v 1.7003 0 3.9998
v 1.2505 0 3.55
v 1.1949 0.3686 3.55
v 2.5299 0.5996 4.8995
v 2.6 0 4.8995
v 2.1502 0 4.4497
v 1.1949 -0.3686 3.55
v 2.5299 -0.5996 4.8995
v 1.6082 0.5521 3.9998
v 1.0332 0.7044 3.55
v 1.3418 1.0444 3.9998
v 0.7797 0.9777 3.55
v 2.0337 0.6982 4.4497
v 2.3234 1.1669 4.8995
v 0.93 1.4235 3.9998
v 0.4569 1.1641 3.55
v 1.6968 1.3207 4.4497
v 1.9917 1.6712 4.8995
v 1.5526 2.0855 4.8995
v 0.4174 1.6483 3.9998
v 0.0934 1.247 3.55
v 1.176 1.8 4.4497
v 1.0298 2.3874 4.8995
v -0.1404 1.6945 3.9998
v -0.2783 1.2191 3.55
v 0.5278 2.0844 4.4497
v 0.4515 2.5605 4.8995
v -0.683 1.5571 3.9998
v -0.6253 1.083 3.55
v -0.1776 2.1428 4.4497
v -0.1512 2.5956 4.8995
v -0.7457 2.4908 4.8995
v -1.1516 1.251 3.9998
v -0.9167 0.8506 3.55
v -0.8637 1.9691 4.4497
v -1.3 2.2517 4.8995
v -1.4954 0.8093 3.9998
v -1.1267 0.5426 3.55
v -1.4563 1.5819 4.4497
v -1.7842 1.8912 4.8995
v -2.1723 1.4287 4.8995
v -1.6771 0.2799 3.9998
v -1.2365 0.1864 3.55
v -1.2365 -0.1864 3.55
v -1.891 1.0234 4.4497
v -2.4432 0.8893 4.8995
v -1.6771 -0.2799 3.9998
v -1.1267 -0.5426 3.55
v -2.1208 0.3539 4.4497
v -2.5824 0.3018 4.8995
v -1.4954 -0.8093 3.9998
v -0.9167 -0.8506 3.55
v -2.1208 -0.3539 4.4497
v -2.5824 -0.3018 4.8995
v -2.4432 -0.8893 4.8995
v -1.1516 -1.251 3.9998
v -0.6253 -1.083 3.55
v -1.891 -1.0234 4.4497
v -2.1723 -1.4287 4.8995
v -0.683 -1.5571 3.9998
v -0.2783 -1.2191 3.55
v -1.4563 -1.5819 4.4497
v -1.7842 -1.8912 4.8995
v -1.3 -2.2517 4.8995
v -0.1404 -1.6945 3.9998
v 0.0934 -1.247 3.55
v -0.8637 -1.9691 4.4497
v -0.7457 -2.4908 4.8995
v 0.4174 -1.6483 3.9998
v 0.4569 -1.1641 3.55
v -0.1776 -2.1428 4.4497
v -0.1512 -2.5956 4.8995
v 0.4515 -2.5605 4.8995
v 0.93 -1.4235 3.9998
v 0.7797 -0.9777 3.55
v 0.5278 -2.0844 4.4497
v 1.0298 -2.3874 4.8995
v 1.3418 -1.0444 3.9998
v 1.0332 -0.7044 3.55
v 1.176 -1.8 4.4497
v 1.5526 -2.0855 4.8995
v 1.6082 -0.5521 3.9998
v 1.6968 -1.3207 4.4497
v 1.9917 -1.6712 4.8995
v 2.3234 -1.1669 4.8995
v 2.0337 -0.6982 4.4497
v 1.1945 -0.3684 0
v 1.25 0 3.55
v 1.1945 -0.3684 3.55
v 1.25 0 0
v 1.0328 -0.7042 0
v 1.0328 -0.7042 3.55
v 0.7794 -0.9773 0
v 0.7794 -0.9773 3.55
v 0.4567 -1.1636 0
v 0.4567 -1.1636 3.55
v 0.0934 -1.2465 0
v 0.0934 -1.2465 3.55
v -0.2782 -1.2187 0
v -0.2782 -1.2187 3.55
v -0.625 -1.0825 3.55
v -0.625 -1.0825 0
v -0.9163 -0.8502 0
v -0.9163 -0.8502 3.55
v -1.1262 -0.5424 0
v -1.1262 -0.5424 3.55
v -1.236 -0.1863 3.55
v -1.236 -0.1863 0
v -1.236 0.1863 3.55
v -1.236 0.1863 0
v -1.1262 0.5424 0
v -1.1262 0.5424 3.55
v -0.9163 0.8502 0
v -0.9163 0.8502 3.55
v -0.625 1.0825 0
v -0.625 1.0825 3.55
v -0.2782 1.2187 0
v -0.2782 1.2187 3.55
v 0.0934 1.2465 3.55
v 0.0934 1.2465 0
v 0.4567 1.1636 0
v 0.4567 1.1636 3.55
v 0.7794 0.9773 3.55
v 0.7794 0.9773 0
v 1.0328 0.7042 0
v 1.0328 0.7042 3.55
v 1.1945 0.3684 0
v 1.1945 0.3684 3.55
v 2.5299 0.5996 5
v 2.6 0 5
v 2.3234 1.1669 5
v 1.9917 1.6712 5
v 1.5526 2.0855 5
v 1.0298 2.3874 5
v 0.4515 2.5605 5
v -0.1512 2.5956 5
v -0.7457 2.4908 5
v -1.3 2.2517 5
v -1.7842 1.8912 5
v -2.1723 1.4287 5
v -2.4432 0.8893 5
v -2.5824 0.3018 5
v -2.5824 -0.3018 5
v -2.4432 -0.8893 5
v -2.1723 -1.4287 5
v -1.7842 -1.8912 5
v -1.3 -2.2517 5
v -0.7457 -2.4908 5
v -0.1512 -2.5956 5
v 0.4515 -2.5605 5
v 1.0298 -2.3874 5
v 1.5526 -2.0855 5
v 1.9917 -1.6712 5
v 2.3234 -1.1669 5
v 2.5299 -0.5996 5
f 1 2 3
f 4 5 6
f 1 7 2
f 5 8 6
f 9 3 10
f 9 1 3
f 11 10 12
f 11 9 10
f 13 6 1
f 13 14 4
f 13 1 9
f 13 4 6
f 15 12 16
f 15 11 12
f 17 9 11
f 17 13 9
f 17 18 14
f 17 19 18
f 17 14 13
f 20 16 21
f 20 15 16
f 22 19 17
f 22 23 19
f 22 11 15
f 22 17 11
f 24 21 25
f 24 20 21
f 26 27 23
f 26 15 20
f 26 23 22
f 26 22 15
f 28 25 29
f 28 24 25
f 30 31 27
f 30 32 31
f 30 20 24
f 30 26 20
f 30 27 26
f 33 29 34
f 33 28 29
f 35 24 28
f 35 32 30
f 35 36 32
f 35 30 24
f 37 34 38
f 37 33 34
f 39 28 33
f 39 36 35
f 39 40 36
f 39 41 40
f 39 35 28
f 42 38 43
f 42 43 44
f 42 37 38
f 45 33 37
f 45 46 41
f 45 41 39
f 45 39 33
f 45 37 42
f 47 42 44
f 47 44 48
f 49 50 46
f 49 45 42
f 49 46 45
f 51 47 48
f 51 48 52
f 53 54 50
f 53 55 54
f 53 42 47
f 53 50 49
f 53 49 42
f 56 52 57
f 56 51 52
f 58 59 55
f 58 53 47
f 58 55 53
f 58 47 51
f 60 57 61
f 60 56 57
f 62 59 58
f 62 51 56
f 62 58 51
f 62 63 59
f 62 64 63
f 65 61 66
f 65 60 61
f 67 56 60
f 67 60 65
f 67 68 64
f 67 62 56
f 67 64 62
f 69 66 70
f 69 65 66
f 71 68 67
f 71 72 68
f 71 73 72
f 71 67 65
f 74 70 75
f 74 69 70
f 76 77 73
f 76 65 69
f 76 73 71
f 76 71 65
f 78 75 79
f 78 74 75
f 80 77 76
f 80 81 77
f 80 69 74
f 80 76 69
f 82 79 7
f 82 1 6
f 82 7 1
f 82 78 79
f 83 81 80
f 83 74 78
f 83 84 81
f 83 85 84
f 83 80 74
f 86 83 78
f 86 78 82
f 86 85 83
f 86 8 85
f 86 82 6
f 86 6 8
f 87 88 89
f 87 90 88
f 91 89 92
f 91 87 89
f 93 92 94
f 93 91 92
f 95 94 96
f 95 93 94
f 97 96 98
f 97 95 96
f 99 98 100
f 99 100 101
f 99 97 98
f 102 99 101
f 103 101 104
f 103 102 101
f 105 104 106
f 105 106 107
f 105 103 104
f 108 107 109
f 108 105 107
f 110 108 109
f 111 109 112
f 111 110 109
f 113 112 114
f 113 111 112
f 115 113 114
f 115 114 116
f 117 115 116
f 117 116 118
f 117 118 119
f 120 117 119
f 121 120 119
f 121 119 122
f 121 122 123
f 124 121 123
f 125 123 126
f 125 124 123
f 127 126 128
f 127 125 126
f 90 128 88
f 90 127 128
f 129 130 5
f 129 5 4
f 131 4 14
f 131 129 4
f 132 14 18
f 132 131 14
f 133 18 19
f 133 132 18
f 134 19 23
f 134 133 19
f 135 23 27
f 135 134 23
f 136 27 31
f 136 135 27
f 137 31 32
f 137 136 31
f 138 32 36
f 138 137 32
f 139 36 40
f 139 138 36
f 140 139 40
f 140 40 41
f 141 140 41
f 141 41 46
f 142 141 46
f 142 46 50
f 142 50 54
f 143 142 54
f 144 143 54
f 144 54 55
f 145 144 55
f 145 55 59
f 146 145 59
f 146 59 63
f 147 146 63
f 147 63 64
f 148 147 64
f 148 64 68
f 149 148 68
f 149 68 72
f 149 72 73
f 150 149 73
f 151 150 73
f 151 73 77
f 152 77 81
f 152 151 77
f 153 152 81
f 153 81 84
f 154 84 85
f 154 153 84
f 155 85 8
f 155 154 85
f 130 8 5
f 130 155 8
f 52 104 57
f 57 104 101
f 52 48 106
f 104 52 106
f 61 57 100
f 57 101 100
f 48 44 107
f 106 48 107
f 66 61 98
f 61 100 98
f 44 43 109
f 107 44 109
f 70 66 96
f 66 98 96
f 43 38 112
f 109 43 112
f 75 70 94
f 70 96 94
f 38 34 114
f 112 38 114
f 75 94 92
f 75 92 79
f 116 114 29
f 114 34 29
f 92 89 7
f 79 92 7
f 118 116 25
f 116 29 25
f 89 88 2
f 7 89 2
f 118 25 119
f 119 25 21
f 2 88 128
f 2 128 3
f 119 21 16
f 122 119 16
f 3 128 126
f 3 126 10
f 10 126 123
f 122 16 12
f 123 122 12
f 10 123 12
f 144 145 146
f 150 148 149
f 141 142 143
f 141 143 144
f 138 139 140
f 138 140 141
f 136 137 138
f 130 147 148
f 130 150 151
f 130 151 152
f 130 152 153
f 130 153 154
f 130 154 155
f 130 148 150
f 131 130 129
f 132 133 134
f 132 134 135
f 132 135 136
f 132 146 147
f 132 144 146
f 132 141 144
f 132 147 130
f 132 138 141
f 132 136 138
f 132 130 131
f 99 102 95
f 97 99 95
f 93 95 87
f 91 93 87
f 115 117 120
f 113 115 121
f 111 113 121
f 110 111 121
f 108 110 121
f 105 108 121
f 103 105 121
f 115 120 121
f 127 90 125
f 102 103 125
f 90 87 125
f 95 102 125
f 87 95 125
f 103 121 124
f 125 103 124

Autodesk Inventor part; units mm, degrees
ref_plane "YZ Plane" through (0, 0, 0) normal (1, 0, 0) x (0, 1, 0)
ref_plane "XZ Plane" through (0, 0, 0) normal (0, 1, 0) x (-1, 0, 0)
ref_plane "XY Plane" through (0, 0, 0) normal (0, 0, 1) x (1, 0, 0)
sketch "スケッチ1" plane through (0, 0, 0) normal (0, 0, 1) x (1, 0, 0)
  circle A0 centre (0, 0) radius 1.25
  dimension "d0" = 2.5
extrude "押し出し1" add sketch "スケッチ1" along normal blind 5
sketch "スケッチ2" plane through (0, 0, 5) normal (0, 0, 1) x (1, 0, 0)
  circle A0 centre (0, 0) radius 2.6
  dimension "d3" = 5.2
extrude "押し出し2" add sketch "スケッチ2" against normal blind 1.45
thread "ねじ1" size "M2.6x0.45" class "6g" standard "ANSI Metric M Profile" full length
chamfer "面取り1" distance 1.35 angle 45 1 edges at (-2.6, 0, 3.55)
properties part number "ネジ皿m2.6,5" material "鋼、高強度、低合金"
